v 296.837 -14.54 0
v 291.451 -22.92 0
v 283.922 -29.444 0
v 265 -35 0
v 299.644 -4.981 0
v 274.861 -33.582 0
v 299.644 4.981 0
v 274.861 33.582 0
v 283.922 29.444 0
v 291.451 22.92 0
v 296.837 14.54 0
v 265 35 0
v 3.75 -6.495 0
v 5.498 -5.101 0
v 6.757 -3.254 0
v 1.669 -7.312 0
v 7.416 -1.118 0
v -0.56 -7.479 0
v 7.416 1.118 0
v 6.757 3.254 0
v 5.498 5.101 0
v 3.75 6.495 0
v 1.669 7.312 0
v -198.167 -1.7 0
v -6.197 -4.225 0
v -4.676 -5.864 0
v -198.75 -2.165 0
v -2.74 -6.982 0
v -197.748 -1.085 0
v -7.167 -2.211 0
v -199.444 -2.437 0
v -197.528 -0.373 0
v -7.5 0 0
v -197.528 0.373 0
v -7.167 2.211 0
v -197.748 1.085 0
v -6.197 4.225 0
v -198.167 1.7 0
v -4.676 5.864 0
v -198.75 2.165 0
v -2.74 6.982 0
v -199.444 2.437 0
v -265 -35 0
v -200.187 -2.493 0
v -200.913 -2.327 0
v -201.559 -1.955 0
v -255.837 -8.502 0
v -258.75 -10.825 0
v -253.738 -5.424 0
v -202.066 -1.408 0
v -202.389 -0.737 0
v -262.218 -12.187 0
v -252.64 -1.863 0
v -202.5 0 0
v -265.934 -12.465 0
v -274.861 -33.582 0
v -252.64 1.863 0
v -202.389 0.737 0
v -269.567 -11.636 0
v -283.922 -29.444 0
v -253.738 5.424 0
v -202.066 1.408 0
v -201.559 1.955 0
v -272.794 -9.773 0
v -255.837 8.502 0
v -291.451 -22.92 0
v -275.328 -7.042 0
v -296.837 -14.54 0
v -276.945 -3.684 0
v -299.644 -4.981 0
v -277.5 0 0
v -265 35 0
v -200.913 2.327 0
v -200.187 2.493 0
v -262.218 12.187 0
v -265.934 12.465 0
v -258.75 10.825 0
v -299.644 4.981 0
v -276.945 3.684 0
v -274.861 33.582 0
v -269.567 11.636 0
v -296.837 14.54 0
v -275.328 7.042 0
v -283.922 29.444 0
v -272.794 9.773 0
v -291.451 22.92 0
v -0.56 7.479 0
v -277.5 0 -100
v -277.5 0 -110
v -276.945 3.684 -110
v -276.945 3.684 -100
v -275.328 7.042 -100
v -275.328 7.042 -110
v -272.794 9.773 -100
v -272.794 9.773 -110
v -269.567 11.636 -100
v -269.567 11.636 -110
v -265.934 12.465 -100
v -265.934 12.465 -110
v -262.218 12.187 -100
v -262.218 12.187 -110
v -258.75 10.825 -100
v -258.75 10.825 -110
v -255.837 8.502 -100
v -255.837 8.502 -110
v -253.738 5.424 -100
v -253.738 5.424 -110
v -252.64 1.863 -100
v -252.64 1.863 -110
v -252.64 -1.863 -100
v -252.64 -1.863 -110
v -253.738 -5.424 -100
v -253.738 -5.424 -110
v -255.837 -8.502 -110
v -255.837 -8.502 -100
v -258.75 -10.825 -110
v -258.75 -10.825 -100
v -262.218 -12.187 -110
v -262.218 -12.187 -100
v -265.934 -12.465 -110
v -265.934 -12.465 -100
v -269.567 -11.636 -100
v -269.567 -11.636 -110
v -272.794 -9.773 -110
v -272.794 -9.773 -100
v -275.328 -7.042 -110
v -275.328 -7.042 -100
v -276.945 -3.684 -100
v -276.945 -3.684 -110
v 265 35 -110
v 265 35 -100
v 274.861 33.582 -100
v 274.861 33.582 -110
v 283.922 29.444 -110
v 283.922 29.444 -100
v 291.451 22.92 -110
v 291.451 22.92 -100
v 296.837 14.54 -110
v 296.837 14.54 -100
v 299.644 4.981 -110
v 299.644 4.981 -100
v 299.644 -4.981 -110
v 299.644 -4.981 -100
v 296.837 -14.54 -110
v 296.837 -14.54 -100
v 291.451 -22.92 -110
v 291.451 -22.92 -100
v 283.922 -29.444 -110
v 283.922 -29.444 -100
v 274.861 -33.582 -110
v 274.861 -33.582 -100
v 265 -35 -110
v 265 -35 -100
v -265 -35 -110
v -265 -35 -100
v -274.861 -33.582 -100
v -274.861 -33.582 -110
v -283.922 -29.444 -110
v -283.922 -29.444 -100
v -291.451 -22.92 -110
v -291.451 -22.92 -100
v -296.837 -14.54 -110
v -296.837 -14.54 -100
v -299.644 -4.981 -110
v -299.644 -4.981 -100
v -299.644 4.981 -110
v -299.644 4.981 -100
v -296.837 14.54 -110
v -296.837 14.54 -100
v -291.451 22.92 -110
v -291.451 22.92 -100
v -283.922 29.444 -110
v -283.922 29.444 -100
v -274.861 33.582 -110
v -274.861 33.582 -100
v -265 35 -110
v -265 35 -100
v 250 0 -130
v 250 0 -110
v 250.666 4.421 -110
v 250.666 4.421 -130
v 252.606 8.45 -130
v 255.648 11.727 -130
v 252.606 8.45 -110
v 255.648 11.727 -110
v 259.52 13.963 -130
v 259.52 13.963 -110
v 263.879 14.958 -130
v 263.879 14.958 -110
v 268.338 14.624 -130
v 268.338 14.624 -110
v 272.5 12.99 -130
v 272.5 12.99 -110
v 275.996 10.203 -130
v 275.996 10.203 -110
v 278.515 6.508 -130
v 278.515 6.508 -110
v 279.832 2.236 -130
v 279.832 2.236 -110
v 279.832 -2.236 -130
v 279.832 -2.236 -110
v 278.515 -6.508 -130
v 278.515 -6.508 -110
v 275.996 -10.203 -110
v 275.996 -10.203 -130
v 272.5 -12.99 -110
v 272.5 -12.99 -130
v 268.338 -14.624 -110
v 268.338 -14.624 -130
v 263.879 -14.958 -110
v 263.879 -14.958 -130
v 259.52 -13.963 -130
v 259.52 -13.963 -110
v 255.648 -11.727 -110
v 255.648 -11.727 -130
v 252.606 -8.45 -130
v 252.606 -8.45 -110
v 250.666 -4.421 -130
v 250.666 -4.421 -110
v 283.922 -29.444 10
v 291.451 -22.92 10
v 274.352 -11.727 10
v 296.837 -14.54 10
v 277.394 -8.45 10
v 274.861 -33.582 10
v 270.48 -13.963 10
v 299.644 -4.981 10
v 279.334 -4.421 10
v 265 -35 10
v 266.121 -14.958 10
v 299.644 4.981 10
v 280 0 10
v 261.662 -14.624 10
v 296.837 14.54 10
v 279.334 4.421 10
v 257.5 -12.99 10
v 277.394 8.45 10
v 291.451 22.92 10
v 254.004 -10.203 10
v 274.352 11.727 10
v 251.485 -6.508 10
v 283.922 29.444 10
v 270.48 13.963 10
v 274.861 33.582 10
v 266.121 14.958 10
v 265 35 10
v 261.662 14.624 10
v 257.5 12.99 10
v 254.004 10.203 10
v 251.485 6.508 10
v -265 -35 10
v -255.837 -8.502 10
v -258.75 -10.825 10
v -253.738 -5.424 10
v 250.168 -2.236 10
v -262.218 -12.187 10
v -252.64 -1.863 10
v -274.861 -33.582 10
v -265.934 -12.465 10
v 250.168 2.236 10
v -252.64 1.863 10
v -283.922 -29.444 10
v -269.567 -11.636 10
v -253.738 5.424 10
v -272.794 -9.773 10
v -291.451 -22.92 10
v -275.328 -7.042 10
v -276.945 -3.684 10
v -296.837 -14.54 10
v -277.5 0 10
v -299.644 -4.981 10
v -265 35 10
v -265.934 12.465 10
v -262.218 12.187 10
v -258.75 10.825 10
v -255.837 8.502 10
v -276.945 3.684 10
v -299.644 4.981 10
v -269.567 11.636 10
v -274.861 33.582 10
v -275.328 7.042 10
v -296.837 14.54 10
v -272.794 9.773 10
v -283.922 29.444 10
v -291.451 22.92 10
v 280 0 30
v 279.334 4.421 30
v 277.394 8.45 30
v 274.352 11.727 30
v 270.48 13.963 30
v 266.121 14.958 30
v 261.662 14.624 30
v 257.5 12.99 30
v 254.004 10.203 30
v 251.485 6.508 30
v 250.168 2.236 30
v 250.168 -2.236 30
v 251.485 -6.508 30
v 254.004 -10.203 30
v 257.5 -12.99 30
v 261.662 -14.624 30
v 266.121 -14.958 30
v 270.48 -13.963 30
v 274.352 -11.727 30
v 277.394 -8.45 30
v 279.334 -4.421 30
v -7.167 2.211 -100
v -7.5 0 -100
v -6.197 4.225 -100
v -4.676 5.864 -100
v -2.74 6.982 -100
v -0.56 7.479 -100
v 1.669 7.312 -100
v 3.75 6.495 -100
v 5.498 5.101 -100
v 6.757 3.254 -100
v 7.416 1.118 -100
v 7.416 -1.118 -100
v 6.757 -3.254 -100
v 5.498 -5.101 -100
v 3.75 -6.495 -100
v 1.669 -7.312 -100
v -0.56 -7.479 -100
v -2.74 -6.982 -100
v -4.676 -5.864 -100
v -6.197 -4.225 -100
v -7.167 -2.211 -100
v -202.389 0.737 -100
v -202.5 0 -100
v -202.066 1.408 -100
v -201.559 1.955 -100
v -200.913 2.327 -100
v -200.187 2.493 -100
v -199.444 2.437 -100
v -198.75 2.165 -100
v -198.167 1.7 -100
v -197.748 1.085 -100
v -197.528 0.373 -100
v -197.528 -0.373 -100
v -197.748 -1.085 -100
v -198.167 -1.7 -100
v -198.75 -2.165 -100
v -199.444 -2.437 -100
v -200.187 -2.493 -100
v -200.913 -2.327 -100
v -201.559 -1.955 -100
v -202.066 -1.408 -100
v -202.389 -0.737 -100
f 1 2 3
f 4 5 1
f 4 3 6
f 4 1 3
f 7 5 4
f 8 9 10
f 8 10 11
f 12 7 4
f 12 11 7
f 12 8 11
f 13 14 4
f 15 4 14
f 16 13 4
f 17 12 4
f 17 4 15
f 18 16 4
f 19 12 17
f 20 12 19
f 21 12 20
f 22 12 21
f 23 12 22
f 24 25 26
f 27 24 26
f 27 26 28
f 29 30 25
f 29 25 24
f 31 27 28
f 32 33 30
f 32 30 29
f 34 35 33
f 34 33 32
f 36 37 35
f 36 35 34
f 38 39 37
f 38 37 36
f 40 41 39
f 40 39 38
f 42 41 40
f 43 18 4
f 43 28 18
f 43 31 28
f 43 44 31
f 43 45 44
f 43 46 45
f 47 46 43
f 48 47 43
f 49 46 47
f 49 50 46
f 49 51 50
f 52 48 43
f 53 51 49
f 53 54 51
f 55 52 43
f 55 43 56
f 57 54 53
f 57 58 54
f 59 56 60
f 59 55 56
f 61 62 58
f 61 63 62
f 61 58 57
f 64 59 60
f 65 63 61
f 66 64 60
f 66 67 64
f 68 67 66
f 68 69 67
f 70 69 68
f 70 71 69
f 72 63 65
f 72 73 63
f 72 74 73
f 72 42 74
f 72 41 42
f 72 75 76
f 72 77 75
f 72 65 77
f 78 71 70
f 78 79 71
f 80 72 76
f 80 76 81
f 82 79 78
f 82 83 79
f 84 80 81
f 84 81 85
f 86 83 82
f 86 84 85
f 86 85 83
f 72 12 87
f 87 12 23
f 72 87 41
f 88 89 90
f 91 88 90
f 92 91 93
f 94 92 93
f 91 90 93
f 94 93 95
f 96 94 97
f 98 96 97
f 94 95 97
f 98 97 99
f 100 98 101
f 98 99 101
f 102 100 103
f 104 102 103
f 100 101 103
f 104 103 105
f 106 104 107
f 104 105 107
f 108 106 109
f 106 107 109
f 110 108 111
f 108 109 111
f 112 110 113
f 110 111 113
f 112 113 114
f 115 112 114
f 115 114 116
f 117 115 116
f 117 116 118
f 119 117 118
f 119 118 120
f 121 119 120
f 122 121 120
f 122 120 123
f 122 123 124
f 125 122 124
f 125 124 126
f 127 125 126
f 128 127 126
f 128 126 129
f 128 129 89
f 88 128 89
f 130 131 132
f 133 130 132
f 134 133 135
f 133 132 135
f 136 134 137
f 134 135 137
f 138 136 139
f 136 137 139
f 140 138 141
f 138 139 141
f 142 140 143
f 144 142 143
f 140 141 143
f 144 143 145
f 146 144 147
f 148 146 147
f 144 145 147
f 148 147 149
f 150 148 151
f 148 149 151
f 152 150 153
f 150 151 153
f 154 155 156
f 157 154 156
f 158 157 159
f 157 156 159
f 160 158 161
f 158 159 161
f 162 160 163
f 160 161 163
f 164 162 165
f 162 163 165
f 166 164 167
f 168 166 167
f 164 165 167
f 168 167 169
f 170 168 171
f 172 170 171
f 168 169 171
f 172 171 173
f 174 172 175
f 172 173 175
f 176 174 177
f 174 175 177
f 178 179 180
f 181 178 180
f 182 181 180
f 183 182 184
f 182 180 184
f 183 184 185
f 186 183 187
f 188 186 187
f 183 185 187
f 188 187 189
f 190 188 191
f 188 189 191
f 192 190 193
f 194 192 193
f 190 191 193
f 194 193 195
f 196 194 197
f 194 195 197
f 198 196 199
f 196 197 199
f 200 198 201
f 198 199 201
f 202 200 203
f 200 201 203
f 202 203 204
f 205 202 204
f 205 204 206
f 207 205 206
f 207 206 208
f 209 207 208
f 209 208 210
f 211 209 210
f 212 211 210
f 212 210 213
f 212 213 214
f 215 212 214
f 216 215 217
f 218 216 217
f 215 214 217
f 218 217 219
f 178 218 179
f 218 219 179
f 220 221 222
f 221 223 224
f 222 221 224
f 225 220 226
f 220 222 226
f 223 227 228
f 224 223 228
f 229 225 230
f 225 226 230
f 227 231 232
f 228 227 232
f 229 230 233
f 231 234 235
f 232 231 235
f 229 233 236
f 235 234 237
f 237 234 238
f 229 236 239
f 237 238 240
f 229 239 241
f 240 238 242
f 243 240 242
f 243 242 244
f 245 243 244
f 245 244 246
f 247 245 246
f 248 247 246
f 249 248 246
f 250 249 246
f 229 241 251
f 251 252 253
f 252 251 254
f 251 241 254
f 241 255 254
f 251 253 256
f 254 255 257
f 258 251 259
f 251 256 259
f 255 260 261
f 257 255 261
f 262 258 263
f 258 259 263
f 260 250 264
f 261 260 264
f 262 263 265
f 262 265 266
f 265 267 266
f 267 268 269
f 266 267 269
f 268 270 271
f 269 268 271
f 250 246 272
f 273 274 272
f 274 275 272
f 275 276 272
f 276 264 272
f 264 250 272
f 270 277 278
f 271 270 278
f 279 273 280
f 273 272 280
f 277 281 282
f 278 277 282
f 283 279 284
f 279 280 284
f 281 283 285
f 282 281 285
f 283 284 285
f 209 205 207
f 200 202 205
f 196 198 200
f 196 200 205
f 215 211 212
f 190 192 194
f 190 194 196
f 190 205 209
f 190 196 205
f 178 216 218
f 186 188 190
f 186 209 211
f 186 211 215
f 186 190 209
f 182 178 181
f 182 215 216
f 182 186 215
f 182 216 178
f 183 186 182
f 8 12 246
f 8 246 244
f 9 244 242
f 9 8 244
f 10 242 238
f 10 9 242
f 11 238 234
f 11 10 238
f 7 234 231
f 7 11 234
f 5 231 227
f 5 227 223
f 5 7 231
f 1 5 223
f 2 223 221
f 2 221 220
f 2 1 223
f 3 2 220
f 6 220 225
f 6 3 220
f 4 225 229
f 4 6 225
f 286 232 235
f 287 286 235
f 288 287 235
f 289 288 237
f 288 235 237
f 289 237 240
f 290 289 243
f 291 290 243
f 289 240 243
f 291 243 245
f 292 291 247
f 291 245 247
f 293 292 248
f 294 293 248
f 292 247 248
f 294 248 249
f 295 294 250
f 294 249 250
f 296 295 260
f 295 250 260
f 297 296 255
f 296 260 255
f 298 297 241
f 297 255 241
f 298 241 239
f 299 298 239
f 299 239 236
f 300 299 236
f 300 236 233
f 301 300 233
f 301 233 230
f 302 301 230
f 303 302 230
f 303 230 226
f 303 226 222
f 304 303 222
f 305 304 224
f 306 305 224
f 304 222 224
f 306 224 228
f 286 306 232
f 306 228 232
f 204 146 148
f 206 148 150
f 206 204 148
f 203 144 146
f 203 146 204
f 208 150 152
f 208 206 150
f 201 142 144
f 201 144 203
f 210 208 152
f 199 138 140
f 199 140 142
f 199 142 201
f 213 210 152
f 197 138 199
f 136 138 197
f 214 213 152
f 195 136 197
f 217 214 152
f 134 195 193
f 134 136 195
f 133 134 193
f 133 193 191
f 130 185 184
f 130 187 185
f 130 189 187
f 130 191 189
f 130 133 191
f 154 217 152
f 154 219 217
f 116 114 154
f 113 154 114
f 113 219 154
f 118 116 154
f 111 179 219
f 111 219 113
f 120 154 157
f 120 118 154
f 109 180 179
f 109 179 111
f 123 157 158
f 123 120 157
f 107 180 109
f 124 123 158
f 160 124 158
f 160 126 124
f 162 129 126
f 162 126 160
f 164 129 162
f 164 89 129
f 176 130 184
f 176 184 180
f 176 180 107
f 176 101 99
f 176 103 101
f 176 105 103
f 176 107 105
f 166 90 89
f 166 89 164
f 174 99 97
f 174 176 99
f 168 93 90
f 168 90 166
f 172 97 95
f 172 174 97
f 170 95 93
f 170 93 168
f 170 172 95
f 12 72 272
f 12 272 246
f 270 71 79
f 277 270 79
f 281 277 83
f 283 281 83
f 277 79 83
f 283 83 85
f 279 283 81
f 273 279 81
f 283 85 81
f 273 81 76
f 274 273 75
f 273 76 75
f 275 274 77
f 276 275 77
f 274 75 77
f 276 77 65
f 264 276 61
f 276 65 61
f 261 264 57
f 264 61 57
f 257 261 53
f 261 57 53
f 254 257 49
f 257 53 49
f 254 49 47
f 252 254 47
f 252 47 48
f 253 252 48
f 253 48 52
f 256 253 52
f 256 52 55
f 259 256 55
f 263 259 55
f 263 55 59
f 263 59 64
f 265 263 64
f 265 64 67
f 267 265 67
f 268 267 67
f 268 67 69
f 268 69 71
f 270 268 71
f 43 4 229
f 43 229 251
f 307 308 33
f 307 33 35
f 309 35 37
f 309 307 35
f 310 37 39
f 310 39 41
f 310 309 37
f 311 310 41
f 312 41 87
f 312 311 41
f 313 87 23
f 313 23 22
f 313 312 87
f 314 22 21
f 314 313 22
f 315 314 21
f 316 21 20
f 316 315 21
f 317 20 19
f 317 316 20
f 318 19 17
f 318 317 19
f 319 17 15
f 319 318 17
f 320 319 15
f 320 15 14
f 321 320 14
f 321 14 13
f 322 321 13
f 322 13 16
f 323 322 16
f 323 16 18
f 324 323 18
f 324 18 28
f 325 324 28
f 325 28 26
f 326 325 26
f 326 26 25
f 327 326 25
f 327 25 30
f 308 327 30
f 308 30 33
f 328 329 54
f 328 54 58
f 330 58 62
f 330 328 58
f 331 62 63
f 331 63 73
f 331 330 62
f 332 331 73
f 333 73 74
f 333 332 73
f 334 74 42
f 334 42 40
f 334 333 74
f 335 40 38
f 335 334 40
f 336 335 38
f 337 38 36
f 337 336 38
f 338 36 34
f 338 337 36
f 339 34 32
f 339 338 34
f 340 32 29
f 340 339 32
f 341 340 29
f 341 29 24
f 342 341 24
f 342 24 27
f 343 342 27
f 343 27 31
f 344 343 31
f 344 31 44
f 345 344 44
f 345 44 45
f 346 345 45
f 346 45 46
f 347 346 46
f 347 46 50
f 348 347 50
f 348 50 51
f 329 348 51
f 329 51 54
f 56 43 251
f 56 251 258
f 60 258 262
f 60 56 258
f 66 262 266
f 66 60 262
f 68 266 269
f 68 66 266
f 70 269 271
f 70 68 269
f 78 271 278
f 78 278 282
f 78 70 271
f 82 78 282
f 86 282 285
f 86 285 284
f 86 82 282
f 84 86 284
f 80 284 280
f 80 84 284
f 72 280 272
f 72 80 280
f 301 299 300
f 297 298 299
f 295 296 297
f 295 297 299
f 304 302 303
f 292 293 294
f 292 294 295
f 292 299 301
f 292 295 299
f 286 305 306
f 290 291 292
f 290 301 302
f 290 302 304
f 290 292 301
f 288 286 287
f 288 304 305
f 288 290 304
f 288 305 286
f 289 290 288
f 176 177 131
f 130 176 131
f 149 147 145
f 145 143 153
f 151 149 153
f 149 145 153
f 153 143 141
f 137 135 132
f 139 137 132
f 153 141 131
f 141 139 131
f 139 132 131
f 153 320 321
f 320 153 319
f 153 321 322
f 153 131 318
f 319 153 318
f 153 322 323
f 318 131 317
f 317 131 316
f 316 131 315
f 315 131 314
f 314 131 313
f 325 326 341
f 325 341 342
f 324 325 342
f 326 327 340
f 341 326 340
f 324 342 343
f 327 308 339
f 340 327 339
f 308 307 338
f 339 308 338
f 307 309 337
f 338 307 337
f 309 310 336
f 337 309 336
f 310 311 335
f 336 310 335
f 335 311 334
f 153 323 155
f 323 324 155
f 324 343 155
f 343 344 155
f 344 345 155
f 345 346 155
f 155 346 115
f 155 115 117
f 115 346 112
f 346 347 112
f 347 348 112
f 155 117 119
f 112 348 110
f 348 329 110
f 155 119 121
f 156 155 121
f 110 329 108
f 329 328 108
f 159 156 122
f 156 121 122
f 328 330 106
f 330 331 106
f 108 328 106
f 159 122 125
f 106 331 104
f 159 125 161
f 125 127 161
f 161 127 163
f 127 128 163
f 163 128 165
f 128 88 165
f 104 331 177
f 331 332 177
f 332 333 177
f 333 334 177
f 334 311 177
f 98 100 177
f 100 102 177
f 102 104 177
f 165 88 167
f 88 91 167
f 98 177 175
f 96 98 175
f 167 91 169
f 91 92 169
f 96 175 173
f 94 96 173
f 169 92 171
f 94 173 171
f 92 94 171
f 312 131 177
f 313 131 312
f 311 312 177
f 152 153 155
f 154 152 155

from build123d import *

# Parameters (mm, degrees)
BOSS_EXTRUDE1_DEPTH = 10
BOSS_EXTRUDE2_DEPTH = 10
SKETCH3_R           = 7.5
BOSS_EXTRUDE3_DEPTH = 145
SKETCH4_R           = 2.5
BOSS_EXTRUDE4_DEPTH = 145
SKETCH6_R           = 12.5
CUT_EXTRUDE1_DEPTH  = 165
SKETCH9_R           = 7.5
CUT_EXTRUDE2_DEPTH  = 25
SKETCH11_R          = 15
BOSS_EXTRUDE6_DEPTH = 20
SKETCH12_R          = 15
BOSS_EXTRUDE7_DEPTH = 20
SKETCH13_R          = 15
CUT_EXTRUDE6_DEPTH  = 25


with BuildPart() as part:
    # Sketch1 → Boss-Extrude1 (new body)
    with BuildSketch(Plane.XY):
        with BuildLine():
            Line((-265, 35), (265, 35))
            ThreePointArc((265, 35), (300, 0), (265, -35))
            Line((265, -35), (-265, -35))
            ThreePointArc((-265, -35), (-300, 0), (-265, 35))
        make_face()
    extrude(amount=BOSS_EXTRUDE1_DEPTH)



with BuildPart() as body_2:
    # Sketch2 → Boss-Extrude2 (new body)
    with BuildSketch(Plane.XY.offset(-100)):
        with BuildLine():
            Line((-265, 35), (265, 35))
            ThreePointArc((265, 35), (300, 0), (265, -35))
            Line((265, -35), (-265, -35))
            ThreePointArc((-265, -35), (-300, 0), (-265, 35))
        make_face()
    extrude(amount=-BOSS_EXTRUDE2_DEPTH)


with BuildPart() as part_1:
    add(part.part)

    add(body_2.part)  # Boss-Extrude3 merges body 2
    # Sketch3 → Boss-Extrude3 (add)
    with BuildSketch(Plane(origin=(0, 0, -110), x_dir=(-1, 0, 0), z_dir=(0, 0, -1))):
        Circle(SKETCH3_R)
    extrude(amount=-BOSS_EXTRUDE3_DEPTH)

    # Sketch4 → Boss-Extrude4 (add)
    with BuildSketch(Plane(origin=(0, 0, -110), x_dir=(-1, 0, 0), z_dir=(0, 0, -1))):
        with Locations((200, 0)):
            Circle(SKETCH4_R)
    extrude(amount=-BOSS_EXTRUDE4_DEPTH)

    # Sketch6 → Cut-Extrude1 (cut)
    with BuildSketch(Plane(origin=(0, 0, -110), x_dir=(-1, 0, 0), z_dir=(0, 0, -1))):
        with Locations((265, 0)):
            Circle(SKETCH6_R)
    extrude(amount=-CUT_EXTRUDE1_DEPTH, mode=Mode.SUBTRACT)

    # Sketch9 → Cut-Extrude2 (cut)
    with BuildSketch(Plane.XY.offset(35)):
        with Locations((-200, 0)):
            Circle(SKETCH9_R)
    extrude(amount=-CUT_EXTRUDE2_DEPTH, mode=Mode.SUBTRACT)

    # Sketch11 → Boss-Extrude6 (add)
    with BuildSketch(Plane.XY.offset(10)):
        with Locations((265, 0)):
            Circle(SKETCH11_R)
    extrude(amount=BOSS_EXTRUDE6_DEPTH)

    # Sketch12 → Boss-Extrude7 (add)
    with BuildSketch(Plane(origin=(0, 0, -110), x_dir=(-1, 0, 0), z_dir=(0, 0, -1))):
        with Locations((-265, 0)):
            Circle(SKETCH12_R)
    extrude(amount=BOSS_EXTRUDE7_DEPTH)

    # Sketch13 → Cut-Extrude6 (cut)
    with BuildSketch(Plane.XY.offset(35)):
        Circle(SKETCH13_R)
    extrude(amount=-CUT_EXTRUDE6_DEPTH, mode=Mode.SUBTRACT)


solid = part_1.part
